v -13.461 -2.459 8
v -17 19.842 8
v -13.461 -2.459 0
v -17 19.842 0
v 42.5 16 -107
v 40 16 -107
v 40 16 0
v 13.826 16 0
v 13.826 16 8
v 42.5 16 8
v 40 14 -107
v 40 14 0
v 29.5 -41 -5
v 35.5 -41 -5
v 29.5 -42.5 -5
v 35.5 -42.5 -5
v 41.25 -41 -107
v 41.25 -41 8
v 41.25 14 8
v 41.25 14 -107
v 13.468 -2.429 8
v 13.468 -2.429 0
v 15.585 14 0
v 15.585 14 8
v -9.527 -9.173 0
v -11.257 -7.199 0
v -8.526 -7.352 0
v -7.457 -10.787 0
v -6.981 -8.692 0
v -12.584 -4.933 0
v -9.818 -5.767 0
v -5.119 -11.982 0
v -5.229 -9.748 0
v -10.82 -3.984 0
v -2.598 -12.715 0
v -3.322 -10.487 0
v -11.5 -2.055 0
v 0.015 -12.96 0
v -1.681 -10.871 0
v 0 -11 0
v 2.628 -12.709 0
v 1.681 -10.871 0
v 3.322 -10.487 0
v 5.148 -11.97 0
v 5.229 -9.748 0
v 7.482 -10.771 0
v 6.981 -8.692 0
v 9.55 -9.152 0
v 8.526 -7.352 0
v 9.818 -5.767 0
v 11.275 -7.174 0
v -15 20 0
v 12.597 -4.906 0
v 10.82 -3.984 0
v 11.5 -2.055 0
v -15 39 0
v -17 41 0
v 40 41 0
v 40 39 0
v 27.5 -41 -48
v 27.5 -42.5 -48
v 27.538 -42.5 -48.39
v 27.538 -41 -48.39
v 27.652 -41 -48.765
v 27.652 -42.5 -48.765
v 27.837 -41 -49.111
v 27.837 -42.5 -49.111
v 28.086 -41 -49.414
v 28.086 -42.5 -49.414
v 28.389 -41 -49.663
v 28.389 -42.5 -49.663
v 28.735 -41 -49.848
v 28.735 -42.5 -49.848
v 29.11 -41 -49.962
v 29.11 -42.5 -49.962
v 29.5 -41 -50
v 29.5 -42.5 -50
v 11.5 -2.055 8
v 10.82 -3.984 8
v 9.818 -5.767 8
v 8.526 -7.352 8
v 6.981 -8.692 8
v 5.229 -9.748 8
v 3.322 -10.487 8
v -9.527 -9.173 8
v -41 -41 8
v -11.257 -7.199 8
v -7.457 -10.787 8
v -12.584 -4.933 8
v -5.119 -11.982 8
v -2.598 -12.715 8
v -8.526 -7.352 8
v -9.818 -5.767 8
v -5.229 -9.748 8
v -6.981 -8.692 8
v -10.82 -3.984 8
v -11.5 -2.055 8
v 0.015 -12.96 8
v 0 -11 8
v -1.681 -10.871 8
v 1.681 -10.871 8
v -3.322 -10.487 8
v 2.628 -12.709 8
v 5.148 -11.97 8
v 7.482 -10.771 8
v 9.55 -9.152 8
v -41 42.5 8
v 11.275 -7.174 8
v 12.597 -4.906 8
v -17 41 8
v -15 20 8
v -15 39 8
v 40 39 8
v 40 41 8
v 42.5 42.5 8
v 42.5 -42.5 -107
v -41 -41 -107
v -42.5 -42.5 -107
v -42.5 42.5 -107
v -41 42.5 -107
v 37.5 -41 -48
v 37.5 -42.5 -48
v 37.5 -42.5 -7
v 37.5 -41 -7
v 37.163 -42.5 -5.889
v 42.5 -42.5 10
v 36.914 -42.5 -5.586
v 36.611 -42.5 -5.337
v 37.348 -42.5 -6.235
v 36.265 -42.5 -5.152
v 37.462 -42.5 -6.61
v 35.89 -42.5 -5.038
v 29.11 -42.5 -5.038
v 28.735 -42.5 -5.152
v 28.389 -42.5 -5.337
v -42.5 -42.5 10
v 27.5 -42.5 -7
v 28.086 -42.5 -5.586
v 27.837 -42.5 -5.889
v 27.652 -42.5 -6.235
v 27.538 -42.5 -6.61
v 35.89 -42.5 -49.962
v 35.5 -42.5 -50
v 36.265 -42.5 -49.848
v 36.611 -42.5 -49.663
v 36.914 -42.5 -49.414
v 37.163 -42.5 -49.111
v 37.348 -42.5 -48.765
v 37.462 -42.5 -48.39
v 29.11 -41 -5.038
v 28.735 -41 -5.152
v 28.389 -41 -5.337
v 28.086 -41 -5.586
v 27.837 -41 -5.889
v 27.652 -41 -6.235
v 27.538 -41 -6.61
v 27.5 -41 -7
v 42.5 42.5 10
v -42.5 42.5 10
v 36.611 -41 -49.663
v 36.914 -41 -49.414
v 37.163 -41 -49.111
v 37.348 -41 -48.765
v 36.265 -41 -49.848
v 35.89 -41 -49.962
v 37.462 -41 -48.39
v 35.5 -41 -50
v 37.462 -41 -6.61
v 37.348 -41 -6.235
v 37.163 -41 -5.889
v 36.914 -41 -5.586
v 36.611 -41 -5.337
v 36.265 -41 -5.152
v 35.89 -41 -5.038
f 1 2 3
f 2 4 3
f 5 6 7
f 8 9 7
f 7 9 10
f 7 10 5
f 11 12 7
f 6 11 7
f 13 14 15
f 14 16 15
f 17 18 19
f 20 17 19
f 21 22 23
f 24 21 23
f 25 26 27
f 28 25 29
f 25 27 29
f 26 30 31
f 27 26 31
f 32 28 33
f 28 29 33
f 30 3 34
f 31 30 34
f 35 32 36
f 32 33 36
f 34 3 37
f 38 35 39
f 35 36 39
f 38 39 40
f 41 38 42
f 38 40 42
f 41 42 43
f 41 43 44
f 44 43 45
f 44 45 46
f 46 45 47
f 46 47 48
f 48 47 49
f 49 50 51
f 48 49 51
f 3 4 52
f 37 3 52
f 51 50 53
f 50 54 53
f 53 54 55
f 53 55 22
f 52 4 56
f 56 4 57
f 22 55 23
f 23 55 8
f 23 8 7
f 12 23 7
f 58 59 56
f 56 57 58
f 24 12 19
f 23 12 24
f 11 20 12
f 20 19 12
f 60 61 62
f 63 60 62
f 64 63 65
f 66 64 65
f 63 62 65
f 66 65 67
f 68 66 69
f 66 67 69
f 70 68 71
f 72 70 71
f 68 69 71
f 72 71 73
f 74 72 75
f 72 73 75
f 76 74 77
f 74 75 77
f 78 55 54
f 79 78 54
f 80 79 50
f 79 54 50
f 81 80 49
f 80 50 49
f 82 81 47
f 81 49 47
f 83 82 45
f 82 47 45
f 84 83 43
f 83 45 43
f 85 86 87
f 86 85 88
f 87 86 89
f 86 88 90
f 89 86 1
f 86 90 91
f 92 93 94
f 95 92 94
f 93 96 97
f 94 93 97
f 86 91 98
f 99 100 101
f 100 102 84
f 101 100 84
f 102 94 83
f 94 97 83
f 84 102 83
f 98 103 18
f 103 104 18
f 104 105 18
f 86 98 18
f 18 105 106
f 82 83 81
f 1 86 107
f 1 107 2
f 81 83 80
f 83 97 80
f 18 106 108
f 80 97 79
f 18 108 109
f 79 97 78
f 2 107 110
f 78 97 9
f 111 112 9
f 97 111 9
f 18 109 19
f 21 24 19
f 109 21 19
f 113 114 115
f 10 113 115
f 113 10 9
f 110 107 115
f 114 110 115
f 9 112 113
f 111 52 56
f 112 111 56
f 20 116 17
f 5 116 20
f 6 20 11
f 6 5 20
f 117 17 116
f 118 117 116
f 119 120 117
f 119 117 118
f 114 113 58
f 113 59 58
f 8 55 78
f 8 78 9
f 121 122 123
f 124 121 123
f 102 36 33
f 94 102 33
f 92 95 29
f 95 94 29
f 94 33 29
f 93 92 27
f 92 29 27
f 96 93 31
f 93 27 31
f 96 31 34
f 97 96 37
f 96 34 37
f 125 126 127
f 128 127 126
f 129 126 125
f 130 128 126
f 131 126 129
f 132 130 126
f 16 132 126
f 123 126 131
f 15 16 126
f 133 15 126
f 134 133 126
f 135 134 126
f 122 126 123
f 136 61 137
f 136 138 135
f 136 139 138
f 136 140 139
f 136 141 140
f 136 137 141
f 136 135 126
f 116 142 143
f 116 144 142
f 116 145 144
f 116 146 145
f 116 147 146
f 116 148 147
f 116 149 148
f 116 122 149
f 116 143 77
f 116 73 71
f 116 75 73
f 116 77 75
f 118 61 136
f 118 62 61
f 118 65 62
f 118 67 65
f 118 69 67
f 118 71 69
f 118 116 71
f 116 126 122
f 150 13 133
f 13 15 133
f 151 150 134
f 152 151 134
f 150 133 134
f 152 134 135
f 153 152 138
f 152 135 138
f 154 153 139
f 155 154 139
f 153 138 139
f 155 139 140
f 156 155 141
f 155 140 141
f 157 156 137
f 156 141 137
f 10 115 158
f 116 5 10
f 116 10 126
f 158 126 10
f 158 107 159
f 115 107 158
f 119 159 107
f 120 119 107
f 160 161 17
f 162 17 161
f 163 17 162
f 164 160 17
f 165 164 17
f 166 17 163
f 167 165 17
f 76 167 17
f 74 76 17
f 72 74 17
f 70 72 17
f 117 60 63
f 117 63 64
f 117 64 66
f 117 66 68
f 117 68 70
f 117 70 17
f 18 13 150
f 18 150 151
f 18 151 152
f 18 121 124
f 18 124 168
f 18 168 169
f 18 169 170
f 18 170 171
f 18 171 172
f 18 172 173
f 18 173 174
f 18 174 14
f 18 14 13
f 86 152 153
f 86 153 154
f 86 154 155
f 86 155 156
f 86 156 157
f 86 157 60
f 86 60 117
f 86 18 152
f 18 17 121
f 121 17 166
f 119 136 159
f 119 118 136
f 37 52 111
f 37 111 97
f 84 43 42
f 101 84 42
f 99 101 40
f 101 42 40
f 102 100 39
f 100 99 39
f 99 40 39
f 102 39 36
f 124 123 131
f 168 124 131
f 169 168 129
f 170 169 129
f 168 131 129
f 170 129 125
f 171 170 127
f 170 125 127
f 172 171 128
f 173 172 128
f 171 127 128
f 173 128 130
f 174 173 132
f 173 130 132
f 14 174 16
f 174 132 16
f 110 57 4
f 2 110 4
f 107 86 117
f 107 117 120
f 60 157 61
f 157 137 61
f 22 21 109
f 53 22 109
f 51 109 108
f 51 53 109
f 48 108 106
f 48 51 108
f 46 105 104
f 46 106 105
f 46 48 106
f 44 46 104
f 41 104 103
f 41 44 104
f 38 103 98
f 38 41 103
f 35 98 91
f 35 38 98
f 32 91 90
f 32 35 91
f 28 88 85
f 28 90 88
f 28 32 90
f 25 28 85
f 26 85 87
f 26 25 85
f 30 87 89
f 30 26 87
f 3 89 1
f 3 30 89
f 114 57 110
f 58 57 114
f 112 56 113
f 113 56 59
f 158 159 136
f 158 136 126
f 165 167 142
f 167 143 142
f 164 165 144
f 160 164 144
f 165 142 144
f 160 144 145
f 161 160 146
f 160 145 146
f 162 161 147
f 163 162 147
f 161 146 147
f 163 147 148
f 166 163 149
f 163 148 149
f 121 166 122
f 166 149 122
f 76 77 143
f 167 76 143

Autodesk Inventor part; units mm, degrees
ref_plane "YZ Plane" through (0, 0, 0) normal (1, 0, 0) x (0, 1, 0)
ref_plane "XZ Plane" through (0, 0, 0) normal (0, 1, 0) x (-1, 0, 0)
ref_plane "XY Plane" through (0, 0, 0) normal (0, 0, 1) x (1, 0, 0)
ref_plane "Work Plane1" through (0, 0, 0) normal (0, 0, 1) x (1, 0, 0)
sketch "Sketch1" plane through (0, 0, 0) normal (0, 0, 1) x (1, 0, 0)
  circle A0 centre (0, 0) radius 11 projected
  circle A1 centre (0, 0) radius 4 projected
  circle A2 centre (0, 0) radius 37.5 projected
  line L0 (0, 0) -> (0, 20) construction
  line L1 (0, 20) -> (-15, 20) construction
  line L2 (0, 20) -> (15, 20) construction
  line L3 (0, -2.0548) -> (-11.5, -2.0548) construction
  line L4 (0, -2.0548) -> (11.5, -2.0548) construction
  arc A3 (-11.5, -2.0548) -> (11.5, -2.0548) centre (0, 0.9175) ccw
  line L5 (-40, -40) -> (40, -40) construction
  line L6 (40, -40) -> (40, 40) construction
  line L7 (40, 40) -> (-40, 40) construction
  line L8 (-40, 40) -> (-40, -40) construction
  line L9 (-40, -40) -> (40, 40) construction
  line L10 (40, -40) -> (-40, 40) construction
  line L11 (0, 11) -> (0, 16) construction
  line L12 (0, 16) -> (13.8259, 16) construction
  line L13 (13.8259, 16) -> (40, 16)
  line L14 (-15, 20) -> (-15, 39)
  line L15 (-15, 39) -> (40, 39)
  line L16 (11.5, -2.0548) -> (13.8259, 16)
  line L17 (-15, 20) -> (-11.5, -2.0548)
  line L18 (-17, 41) -> (-17, 19.8423)
  line L19 (-17, 19.8423) -> (-13.4609, -2.459)
  arc A4 (-13.4609, -2.459) -> (13.4683, -2.4294) centre (0, 0.9175) ccw
  line L20 (13.4683, -2.4294) -> (15.5848, 14)
  line L21 (40, 39) -> (40, 41)
  line L22 (40, 16) -> (40, 14)
  line L23 (-17, 41) -> (40, 41)
  line L24 (40, 14) -> (15.5848, 14)
  point P0 (0, 0)
  dimension "d0" = 15
  dimension "d1" = 20
  dimension "d2" = 15
  dimension "d3" = 11.5
  dimension "d4" = 11.5
  dimension "d5" = 80
  dimension "d6" = 80
  dimension "d7" = 5
  dimension "d8" = 23
  dimension "d9" = 2
extrude "Extrusion1" add sketch "Sketch1" along normal blind 8 contours A0 A3 L16 L13 A2 L24 L20 A4 L19 L18 L14 L17 | A2 L18 L23 L21 L15 L14 | L13 L22 L24 A2
sketch "Sketch2" plane through (0, 0, 8) normal (0, 0, 1) x (1, 0, 0)
  line L0 (-42.5, 42.5) -> (42.5, 42.5)
  line L1 (42.5, 42.5) -> (42.5, -42.5)
  line L2 (42.5, -42.5) -> (-42.5, -42.5)
  line L3 (-42.5, -42.5) -> (-42.5, 42.5)
  line L4 (-42.5, 42.5) -> (42.5, -42.5) construction
  line L5 (42.5, 42.5) -> (-42.5, -42.5) construction
  point P0 (0, 0)
  dimension "d12" = 85
  dimension "d13" = 85
extrude "Extrusion2" add sketch "Sketch2" along normal blind 2
sketch "Sketch3" plane through (0, 0, 8) normal (0, 0, -1) x (-1, 0, 0)
  line L0 (-13.4683, -2.4294) -> (-15.5848, 14) projected
  arc A0 (-13.4683, -2.4294) -> (13.4609, -2.459) centre (0, 0.9175) ccw projected
  line L1 (17, 19.8423) -> (13.4609, -2.459) projected
  line L2 (17, 41) -> (17, 19.8423) projected
  line L3 (-40, 41) -> (17, 41) projected
  line L4 (-40, 39) -> (-40, 41) projected
  line L5 (15, 39) -> (-40, 39) projected
  line L6 (15, 20) -> (15, 39) projected
  line L7 (11.5, -2.0548) -> (15, 20) projected
  arc A1 (-11.5, -2.0548) -> (11.5, -2.0548) centre (0, 0.9175) ccw projected
  line L8 (-13.8259, 16) -> (-11.5, -2.0548) projected
  line L9 (-40, 16) -> (-13.8259, 16) projected
  line L10 (-40, 14) -> (-40, 16) projected
  line L11 (-15.5848, 14) -> (-40, 14) projected
  line L12 (42.5, 42.5) -> (42.5, -42.5) projected
  line L13 (-42.5, 42.5) -> (42.5, 42.5) projected
  line L14 (-42.5, -42.5) -> (-42.5, 42.5) projected
  line L15 (42.5, -42.5) -> (-42.5, -42.5) projected
  arc A2 (-13.4683, -2.4294) -> (13.4609, -2.459) centre (0, 0.9175) ccw projected
  line L16 (-13.4683, -2.4294) -> (-15.5848, 14) projected
  line L17 (-15.5848, 14) -> (-40, 14) projected
  line L18 (-40, 14) -> (-40, 16) projected
  line L19 (-40, 16) -> (-13.8259, 16) projected
  line L20 (-13.8259, 16) -> (-11.5, -2.0548) projected
  arc A3 (-11.5, -2.0548) -> (11.5, -2.0548) centre (0, 0.9175) ccw projected
  line L21 (11.5, -2.0548) -> (15, 20) projected
  line L22 (15, 20) -> (15, 39) projected
  line L23 (15, 39) -> (-40, 39) projected
  line L24 (-40, 39) -> (-40, 41) projected
  line L25 (-40, 41) -> (17, 41) projected
  line L26 (17, 41) -> (17, 19.8423) projected
  line L27 (17, 19.8423) -> (13.4609, -2.459) projected
  line L28 (42.5, -42.5) -> (-42.5, -42.5) projected
  line L29 (-42.5, 42.5) -> (42.5, 42.5)
  line L30 (42.5, 42.5) -> (42.5, -42.5)
  line L31 (42.5, -42.5) -> (-42.5, -42.5)
  line L32 (-42.5, -42.5) -> (-42.5, 42.5) construction
  line L33 (41, 41) -> (-41, 41)
  line L34 (-41.25, -41) -> (41, -41)
  line L35 (41, -41) -> (41, 41)
  line L36 (-40, 14) -> (-40, 16) projected
  line L37 (-40, 16) -> (-42.5, 16)
  line L38 (-15.5848, 14) -> (-40, 14) projected
  line L39 (-40, 14) -> (-42.5, 14)
  line L40 (-40, 39) -> (-42.5, 39)
  line L41 (-40, 41) -> (17, 41) projected
  line L42 (-40, 41) -> (-42.5, 41)
  line L43 (-41.25, -41) -> (-41.25, 14)
  line L44 (-42.5, -42.5) -> (-42.5, 42.5) projected
  line L45 (-42.5, -42.5) -> (-42.5, 14)
  line L46 (-40, 41) -> (17, 41)
  line L47 (-42.5, 41) -> (-42.5, 39)
  line L48 (41, 41) -> (41, 42.5)
  line L49 (-42.5, 42.5) -> (42.5, 42.5) projected
  point P0 (0, 0)
  dimension "d16" = 1.5
  dimension "d19" = 1.5
extrude "Extrusion4" add sketch "Sketch3" along normal blind 115 contours L39 L14 L37 L10 | L43 L34 L35 L48 L13 L12 L15 L14 L39
sketch "Sketch4" plane through (-42.5, -42.5, 10) normal (0, -1, 0) x (1, 0, 0)
  line L0 (78, -15) -> (72, -15)
  line L1 (70, -17) -> (70, -58)
  line L2 (72, -60) -> (78, -60)
  line L3 (80, -58) -> (80, -17)
  line L4 (0, 0) -> (85, 0) projected
  line L5 (85, -117) -> (85, 0) projected
  arc A0 (80, -17) -> (78, -15) centre (78, -17) ccw
  arc A1 (78, -60) -> (80, -58) centre (78, -58) ccw
  arc A2 (70, -58) -> (72, -60) centre (72, -58) ccw
  arc A3 (72, -15) -> (70, -17) centre (72, -17) ccw
  point P0 (42.5, -10)
  dimension "d22" = 15
  dimension "d23" = 5
  dimension "d24" = 15
  dimension "d25" = 60
  dimension "d26" = 2
extrude "Extrusion5" cut sketch "Sketch4" against normal through all
properties part number "Mount"
